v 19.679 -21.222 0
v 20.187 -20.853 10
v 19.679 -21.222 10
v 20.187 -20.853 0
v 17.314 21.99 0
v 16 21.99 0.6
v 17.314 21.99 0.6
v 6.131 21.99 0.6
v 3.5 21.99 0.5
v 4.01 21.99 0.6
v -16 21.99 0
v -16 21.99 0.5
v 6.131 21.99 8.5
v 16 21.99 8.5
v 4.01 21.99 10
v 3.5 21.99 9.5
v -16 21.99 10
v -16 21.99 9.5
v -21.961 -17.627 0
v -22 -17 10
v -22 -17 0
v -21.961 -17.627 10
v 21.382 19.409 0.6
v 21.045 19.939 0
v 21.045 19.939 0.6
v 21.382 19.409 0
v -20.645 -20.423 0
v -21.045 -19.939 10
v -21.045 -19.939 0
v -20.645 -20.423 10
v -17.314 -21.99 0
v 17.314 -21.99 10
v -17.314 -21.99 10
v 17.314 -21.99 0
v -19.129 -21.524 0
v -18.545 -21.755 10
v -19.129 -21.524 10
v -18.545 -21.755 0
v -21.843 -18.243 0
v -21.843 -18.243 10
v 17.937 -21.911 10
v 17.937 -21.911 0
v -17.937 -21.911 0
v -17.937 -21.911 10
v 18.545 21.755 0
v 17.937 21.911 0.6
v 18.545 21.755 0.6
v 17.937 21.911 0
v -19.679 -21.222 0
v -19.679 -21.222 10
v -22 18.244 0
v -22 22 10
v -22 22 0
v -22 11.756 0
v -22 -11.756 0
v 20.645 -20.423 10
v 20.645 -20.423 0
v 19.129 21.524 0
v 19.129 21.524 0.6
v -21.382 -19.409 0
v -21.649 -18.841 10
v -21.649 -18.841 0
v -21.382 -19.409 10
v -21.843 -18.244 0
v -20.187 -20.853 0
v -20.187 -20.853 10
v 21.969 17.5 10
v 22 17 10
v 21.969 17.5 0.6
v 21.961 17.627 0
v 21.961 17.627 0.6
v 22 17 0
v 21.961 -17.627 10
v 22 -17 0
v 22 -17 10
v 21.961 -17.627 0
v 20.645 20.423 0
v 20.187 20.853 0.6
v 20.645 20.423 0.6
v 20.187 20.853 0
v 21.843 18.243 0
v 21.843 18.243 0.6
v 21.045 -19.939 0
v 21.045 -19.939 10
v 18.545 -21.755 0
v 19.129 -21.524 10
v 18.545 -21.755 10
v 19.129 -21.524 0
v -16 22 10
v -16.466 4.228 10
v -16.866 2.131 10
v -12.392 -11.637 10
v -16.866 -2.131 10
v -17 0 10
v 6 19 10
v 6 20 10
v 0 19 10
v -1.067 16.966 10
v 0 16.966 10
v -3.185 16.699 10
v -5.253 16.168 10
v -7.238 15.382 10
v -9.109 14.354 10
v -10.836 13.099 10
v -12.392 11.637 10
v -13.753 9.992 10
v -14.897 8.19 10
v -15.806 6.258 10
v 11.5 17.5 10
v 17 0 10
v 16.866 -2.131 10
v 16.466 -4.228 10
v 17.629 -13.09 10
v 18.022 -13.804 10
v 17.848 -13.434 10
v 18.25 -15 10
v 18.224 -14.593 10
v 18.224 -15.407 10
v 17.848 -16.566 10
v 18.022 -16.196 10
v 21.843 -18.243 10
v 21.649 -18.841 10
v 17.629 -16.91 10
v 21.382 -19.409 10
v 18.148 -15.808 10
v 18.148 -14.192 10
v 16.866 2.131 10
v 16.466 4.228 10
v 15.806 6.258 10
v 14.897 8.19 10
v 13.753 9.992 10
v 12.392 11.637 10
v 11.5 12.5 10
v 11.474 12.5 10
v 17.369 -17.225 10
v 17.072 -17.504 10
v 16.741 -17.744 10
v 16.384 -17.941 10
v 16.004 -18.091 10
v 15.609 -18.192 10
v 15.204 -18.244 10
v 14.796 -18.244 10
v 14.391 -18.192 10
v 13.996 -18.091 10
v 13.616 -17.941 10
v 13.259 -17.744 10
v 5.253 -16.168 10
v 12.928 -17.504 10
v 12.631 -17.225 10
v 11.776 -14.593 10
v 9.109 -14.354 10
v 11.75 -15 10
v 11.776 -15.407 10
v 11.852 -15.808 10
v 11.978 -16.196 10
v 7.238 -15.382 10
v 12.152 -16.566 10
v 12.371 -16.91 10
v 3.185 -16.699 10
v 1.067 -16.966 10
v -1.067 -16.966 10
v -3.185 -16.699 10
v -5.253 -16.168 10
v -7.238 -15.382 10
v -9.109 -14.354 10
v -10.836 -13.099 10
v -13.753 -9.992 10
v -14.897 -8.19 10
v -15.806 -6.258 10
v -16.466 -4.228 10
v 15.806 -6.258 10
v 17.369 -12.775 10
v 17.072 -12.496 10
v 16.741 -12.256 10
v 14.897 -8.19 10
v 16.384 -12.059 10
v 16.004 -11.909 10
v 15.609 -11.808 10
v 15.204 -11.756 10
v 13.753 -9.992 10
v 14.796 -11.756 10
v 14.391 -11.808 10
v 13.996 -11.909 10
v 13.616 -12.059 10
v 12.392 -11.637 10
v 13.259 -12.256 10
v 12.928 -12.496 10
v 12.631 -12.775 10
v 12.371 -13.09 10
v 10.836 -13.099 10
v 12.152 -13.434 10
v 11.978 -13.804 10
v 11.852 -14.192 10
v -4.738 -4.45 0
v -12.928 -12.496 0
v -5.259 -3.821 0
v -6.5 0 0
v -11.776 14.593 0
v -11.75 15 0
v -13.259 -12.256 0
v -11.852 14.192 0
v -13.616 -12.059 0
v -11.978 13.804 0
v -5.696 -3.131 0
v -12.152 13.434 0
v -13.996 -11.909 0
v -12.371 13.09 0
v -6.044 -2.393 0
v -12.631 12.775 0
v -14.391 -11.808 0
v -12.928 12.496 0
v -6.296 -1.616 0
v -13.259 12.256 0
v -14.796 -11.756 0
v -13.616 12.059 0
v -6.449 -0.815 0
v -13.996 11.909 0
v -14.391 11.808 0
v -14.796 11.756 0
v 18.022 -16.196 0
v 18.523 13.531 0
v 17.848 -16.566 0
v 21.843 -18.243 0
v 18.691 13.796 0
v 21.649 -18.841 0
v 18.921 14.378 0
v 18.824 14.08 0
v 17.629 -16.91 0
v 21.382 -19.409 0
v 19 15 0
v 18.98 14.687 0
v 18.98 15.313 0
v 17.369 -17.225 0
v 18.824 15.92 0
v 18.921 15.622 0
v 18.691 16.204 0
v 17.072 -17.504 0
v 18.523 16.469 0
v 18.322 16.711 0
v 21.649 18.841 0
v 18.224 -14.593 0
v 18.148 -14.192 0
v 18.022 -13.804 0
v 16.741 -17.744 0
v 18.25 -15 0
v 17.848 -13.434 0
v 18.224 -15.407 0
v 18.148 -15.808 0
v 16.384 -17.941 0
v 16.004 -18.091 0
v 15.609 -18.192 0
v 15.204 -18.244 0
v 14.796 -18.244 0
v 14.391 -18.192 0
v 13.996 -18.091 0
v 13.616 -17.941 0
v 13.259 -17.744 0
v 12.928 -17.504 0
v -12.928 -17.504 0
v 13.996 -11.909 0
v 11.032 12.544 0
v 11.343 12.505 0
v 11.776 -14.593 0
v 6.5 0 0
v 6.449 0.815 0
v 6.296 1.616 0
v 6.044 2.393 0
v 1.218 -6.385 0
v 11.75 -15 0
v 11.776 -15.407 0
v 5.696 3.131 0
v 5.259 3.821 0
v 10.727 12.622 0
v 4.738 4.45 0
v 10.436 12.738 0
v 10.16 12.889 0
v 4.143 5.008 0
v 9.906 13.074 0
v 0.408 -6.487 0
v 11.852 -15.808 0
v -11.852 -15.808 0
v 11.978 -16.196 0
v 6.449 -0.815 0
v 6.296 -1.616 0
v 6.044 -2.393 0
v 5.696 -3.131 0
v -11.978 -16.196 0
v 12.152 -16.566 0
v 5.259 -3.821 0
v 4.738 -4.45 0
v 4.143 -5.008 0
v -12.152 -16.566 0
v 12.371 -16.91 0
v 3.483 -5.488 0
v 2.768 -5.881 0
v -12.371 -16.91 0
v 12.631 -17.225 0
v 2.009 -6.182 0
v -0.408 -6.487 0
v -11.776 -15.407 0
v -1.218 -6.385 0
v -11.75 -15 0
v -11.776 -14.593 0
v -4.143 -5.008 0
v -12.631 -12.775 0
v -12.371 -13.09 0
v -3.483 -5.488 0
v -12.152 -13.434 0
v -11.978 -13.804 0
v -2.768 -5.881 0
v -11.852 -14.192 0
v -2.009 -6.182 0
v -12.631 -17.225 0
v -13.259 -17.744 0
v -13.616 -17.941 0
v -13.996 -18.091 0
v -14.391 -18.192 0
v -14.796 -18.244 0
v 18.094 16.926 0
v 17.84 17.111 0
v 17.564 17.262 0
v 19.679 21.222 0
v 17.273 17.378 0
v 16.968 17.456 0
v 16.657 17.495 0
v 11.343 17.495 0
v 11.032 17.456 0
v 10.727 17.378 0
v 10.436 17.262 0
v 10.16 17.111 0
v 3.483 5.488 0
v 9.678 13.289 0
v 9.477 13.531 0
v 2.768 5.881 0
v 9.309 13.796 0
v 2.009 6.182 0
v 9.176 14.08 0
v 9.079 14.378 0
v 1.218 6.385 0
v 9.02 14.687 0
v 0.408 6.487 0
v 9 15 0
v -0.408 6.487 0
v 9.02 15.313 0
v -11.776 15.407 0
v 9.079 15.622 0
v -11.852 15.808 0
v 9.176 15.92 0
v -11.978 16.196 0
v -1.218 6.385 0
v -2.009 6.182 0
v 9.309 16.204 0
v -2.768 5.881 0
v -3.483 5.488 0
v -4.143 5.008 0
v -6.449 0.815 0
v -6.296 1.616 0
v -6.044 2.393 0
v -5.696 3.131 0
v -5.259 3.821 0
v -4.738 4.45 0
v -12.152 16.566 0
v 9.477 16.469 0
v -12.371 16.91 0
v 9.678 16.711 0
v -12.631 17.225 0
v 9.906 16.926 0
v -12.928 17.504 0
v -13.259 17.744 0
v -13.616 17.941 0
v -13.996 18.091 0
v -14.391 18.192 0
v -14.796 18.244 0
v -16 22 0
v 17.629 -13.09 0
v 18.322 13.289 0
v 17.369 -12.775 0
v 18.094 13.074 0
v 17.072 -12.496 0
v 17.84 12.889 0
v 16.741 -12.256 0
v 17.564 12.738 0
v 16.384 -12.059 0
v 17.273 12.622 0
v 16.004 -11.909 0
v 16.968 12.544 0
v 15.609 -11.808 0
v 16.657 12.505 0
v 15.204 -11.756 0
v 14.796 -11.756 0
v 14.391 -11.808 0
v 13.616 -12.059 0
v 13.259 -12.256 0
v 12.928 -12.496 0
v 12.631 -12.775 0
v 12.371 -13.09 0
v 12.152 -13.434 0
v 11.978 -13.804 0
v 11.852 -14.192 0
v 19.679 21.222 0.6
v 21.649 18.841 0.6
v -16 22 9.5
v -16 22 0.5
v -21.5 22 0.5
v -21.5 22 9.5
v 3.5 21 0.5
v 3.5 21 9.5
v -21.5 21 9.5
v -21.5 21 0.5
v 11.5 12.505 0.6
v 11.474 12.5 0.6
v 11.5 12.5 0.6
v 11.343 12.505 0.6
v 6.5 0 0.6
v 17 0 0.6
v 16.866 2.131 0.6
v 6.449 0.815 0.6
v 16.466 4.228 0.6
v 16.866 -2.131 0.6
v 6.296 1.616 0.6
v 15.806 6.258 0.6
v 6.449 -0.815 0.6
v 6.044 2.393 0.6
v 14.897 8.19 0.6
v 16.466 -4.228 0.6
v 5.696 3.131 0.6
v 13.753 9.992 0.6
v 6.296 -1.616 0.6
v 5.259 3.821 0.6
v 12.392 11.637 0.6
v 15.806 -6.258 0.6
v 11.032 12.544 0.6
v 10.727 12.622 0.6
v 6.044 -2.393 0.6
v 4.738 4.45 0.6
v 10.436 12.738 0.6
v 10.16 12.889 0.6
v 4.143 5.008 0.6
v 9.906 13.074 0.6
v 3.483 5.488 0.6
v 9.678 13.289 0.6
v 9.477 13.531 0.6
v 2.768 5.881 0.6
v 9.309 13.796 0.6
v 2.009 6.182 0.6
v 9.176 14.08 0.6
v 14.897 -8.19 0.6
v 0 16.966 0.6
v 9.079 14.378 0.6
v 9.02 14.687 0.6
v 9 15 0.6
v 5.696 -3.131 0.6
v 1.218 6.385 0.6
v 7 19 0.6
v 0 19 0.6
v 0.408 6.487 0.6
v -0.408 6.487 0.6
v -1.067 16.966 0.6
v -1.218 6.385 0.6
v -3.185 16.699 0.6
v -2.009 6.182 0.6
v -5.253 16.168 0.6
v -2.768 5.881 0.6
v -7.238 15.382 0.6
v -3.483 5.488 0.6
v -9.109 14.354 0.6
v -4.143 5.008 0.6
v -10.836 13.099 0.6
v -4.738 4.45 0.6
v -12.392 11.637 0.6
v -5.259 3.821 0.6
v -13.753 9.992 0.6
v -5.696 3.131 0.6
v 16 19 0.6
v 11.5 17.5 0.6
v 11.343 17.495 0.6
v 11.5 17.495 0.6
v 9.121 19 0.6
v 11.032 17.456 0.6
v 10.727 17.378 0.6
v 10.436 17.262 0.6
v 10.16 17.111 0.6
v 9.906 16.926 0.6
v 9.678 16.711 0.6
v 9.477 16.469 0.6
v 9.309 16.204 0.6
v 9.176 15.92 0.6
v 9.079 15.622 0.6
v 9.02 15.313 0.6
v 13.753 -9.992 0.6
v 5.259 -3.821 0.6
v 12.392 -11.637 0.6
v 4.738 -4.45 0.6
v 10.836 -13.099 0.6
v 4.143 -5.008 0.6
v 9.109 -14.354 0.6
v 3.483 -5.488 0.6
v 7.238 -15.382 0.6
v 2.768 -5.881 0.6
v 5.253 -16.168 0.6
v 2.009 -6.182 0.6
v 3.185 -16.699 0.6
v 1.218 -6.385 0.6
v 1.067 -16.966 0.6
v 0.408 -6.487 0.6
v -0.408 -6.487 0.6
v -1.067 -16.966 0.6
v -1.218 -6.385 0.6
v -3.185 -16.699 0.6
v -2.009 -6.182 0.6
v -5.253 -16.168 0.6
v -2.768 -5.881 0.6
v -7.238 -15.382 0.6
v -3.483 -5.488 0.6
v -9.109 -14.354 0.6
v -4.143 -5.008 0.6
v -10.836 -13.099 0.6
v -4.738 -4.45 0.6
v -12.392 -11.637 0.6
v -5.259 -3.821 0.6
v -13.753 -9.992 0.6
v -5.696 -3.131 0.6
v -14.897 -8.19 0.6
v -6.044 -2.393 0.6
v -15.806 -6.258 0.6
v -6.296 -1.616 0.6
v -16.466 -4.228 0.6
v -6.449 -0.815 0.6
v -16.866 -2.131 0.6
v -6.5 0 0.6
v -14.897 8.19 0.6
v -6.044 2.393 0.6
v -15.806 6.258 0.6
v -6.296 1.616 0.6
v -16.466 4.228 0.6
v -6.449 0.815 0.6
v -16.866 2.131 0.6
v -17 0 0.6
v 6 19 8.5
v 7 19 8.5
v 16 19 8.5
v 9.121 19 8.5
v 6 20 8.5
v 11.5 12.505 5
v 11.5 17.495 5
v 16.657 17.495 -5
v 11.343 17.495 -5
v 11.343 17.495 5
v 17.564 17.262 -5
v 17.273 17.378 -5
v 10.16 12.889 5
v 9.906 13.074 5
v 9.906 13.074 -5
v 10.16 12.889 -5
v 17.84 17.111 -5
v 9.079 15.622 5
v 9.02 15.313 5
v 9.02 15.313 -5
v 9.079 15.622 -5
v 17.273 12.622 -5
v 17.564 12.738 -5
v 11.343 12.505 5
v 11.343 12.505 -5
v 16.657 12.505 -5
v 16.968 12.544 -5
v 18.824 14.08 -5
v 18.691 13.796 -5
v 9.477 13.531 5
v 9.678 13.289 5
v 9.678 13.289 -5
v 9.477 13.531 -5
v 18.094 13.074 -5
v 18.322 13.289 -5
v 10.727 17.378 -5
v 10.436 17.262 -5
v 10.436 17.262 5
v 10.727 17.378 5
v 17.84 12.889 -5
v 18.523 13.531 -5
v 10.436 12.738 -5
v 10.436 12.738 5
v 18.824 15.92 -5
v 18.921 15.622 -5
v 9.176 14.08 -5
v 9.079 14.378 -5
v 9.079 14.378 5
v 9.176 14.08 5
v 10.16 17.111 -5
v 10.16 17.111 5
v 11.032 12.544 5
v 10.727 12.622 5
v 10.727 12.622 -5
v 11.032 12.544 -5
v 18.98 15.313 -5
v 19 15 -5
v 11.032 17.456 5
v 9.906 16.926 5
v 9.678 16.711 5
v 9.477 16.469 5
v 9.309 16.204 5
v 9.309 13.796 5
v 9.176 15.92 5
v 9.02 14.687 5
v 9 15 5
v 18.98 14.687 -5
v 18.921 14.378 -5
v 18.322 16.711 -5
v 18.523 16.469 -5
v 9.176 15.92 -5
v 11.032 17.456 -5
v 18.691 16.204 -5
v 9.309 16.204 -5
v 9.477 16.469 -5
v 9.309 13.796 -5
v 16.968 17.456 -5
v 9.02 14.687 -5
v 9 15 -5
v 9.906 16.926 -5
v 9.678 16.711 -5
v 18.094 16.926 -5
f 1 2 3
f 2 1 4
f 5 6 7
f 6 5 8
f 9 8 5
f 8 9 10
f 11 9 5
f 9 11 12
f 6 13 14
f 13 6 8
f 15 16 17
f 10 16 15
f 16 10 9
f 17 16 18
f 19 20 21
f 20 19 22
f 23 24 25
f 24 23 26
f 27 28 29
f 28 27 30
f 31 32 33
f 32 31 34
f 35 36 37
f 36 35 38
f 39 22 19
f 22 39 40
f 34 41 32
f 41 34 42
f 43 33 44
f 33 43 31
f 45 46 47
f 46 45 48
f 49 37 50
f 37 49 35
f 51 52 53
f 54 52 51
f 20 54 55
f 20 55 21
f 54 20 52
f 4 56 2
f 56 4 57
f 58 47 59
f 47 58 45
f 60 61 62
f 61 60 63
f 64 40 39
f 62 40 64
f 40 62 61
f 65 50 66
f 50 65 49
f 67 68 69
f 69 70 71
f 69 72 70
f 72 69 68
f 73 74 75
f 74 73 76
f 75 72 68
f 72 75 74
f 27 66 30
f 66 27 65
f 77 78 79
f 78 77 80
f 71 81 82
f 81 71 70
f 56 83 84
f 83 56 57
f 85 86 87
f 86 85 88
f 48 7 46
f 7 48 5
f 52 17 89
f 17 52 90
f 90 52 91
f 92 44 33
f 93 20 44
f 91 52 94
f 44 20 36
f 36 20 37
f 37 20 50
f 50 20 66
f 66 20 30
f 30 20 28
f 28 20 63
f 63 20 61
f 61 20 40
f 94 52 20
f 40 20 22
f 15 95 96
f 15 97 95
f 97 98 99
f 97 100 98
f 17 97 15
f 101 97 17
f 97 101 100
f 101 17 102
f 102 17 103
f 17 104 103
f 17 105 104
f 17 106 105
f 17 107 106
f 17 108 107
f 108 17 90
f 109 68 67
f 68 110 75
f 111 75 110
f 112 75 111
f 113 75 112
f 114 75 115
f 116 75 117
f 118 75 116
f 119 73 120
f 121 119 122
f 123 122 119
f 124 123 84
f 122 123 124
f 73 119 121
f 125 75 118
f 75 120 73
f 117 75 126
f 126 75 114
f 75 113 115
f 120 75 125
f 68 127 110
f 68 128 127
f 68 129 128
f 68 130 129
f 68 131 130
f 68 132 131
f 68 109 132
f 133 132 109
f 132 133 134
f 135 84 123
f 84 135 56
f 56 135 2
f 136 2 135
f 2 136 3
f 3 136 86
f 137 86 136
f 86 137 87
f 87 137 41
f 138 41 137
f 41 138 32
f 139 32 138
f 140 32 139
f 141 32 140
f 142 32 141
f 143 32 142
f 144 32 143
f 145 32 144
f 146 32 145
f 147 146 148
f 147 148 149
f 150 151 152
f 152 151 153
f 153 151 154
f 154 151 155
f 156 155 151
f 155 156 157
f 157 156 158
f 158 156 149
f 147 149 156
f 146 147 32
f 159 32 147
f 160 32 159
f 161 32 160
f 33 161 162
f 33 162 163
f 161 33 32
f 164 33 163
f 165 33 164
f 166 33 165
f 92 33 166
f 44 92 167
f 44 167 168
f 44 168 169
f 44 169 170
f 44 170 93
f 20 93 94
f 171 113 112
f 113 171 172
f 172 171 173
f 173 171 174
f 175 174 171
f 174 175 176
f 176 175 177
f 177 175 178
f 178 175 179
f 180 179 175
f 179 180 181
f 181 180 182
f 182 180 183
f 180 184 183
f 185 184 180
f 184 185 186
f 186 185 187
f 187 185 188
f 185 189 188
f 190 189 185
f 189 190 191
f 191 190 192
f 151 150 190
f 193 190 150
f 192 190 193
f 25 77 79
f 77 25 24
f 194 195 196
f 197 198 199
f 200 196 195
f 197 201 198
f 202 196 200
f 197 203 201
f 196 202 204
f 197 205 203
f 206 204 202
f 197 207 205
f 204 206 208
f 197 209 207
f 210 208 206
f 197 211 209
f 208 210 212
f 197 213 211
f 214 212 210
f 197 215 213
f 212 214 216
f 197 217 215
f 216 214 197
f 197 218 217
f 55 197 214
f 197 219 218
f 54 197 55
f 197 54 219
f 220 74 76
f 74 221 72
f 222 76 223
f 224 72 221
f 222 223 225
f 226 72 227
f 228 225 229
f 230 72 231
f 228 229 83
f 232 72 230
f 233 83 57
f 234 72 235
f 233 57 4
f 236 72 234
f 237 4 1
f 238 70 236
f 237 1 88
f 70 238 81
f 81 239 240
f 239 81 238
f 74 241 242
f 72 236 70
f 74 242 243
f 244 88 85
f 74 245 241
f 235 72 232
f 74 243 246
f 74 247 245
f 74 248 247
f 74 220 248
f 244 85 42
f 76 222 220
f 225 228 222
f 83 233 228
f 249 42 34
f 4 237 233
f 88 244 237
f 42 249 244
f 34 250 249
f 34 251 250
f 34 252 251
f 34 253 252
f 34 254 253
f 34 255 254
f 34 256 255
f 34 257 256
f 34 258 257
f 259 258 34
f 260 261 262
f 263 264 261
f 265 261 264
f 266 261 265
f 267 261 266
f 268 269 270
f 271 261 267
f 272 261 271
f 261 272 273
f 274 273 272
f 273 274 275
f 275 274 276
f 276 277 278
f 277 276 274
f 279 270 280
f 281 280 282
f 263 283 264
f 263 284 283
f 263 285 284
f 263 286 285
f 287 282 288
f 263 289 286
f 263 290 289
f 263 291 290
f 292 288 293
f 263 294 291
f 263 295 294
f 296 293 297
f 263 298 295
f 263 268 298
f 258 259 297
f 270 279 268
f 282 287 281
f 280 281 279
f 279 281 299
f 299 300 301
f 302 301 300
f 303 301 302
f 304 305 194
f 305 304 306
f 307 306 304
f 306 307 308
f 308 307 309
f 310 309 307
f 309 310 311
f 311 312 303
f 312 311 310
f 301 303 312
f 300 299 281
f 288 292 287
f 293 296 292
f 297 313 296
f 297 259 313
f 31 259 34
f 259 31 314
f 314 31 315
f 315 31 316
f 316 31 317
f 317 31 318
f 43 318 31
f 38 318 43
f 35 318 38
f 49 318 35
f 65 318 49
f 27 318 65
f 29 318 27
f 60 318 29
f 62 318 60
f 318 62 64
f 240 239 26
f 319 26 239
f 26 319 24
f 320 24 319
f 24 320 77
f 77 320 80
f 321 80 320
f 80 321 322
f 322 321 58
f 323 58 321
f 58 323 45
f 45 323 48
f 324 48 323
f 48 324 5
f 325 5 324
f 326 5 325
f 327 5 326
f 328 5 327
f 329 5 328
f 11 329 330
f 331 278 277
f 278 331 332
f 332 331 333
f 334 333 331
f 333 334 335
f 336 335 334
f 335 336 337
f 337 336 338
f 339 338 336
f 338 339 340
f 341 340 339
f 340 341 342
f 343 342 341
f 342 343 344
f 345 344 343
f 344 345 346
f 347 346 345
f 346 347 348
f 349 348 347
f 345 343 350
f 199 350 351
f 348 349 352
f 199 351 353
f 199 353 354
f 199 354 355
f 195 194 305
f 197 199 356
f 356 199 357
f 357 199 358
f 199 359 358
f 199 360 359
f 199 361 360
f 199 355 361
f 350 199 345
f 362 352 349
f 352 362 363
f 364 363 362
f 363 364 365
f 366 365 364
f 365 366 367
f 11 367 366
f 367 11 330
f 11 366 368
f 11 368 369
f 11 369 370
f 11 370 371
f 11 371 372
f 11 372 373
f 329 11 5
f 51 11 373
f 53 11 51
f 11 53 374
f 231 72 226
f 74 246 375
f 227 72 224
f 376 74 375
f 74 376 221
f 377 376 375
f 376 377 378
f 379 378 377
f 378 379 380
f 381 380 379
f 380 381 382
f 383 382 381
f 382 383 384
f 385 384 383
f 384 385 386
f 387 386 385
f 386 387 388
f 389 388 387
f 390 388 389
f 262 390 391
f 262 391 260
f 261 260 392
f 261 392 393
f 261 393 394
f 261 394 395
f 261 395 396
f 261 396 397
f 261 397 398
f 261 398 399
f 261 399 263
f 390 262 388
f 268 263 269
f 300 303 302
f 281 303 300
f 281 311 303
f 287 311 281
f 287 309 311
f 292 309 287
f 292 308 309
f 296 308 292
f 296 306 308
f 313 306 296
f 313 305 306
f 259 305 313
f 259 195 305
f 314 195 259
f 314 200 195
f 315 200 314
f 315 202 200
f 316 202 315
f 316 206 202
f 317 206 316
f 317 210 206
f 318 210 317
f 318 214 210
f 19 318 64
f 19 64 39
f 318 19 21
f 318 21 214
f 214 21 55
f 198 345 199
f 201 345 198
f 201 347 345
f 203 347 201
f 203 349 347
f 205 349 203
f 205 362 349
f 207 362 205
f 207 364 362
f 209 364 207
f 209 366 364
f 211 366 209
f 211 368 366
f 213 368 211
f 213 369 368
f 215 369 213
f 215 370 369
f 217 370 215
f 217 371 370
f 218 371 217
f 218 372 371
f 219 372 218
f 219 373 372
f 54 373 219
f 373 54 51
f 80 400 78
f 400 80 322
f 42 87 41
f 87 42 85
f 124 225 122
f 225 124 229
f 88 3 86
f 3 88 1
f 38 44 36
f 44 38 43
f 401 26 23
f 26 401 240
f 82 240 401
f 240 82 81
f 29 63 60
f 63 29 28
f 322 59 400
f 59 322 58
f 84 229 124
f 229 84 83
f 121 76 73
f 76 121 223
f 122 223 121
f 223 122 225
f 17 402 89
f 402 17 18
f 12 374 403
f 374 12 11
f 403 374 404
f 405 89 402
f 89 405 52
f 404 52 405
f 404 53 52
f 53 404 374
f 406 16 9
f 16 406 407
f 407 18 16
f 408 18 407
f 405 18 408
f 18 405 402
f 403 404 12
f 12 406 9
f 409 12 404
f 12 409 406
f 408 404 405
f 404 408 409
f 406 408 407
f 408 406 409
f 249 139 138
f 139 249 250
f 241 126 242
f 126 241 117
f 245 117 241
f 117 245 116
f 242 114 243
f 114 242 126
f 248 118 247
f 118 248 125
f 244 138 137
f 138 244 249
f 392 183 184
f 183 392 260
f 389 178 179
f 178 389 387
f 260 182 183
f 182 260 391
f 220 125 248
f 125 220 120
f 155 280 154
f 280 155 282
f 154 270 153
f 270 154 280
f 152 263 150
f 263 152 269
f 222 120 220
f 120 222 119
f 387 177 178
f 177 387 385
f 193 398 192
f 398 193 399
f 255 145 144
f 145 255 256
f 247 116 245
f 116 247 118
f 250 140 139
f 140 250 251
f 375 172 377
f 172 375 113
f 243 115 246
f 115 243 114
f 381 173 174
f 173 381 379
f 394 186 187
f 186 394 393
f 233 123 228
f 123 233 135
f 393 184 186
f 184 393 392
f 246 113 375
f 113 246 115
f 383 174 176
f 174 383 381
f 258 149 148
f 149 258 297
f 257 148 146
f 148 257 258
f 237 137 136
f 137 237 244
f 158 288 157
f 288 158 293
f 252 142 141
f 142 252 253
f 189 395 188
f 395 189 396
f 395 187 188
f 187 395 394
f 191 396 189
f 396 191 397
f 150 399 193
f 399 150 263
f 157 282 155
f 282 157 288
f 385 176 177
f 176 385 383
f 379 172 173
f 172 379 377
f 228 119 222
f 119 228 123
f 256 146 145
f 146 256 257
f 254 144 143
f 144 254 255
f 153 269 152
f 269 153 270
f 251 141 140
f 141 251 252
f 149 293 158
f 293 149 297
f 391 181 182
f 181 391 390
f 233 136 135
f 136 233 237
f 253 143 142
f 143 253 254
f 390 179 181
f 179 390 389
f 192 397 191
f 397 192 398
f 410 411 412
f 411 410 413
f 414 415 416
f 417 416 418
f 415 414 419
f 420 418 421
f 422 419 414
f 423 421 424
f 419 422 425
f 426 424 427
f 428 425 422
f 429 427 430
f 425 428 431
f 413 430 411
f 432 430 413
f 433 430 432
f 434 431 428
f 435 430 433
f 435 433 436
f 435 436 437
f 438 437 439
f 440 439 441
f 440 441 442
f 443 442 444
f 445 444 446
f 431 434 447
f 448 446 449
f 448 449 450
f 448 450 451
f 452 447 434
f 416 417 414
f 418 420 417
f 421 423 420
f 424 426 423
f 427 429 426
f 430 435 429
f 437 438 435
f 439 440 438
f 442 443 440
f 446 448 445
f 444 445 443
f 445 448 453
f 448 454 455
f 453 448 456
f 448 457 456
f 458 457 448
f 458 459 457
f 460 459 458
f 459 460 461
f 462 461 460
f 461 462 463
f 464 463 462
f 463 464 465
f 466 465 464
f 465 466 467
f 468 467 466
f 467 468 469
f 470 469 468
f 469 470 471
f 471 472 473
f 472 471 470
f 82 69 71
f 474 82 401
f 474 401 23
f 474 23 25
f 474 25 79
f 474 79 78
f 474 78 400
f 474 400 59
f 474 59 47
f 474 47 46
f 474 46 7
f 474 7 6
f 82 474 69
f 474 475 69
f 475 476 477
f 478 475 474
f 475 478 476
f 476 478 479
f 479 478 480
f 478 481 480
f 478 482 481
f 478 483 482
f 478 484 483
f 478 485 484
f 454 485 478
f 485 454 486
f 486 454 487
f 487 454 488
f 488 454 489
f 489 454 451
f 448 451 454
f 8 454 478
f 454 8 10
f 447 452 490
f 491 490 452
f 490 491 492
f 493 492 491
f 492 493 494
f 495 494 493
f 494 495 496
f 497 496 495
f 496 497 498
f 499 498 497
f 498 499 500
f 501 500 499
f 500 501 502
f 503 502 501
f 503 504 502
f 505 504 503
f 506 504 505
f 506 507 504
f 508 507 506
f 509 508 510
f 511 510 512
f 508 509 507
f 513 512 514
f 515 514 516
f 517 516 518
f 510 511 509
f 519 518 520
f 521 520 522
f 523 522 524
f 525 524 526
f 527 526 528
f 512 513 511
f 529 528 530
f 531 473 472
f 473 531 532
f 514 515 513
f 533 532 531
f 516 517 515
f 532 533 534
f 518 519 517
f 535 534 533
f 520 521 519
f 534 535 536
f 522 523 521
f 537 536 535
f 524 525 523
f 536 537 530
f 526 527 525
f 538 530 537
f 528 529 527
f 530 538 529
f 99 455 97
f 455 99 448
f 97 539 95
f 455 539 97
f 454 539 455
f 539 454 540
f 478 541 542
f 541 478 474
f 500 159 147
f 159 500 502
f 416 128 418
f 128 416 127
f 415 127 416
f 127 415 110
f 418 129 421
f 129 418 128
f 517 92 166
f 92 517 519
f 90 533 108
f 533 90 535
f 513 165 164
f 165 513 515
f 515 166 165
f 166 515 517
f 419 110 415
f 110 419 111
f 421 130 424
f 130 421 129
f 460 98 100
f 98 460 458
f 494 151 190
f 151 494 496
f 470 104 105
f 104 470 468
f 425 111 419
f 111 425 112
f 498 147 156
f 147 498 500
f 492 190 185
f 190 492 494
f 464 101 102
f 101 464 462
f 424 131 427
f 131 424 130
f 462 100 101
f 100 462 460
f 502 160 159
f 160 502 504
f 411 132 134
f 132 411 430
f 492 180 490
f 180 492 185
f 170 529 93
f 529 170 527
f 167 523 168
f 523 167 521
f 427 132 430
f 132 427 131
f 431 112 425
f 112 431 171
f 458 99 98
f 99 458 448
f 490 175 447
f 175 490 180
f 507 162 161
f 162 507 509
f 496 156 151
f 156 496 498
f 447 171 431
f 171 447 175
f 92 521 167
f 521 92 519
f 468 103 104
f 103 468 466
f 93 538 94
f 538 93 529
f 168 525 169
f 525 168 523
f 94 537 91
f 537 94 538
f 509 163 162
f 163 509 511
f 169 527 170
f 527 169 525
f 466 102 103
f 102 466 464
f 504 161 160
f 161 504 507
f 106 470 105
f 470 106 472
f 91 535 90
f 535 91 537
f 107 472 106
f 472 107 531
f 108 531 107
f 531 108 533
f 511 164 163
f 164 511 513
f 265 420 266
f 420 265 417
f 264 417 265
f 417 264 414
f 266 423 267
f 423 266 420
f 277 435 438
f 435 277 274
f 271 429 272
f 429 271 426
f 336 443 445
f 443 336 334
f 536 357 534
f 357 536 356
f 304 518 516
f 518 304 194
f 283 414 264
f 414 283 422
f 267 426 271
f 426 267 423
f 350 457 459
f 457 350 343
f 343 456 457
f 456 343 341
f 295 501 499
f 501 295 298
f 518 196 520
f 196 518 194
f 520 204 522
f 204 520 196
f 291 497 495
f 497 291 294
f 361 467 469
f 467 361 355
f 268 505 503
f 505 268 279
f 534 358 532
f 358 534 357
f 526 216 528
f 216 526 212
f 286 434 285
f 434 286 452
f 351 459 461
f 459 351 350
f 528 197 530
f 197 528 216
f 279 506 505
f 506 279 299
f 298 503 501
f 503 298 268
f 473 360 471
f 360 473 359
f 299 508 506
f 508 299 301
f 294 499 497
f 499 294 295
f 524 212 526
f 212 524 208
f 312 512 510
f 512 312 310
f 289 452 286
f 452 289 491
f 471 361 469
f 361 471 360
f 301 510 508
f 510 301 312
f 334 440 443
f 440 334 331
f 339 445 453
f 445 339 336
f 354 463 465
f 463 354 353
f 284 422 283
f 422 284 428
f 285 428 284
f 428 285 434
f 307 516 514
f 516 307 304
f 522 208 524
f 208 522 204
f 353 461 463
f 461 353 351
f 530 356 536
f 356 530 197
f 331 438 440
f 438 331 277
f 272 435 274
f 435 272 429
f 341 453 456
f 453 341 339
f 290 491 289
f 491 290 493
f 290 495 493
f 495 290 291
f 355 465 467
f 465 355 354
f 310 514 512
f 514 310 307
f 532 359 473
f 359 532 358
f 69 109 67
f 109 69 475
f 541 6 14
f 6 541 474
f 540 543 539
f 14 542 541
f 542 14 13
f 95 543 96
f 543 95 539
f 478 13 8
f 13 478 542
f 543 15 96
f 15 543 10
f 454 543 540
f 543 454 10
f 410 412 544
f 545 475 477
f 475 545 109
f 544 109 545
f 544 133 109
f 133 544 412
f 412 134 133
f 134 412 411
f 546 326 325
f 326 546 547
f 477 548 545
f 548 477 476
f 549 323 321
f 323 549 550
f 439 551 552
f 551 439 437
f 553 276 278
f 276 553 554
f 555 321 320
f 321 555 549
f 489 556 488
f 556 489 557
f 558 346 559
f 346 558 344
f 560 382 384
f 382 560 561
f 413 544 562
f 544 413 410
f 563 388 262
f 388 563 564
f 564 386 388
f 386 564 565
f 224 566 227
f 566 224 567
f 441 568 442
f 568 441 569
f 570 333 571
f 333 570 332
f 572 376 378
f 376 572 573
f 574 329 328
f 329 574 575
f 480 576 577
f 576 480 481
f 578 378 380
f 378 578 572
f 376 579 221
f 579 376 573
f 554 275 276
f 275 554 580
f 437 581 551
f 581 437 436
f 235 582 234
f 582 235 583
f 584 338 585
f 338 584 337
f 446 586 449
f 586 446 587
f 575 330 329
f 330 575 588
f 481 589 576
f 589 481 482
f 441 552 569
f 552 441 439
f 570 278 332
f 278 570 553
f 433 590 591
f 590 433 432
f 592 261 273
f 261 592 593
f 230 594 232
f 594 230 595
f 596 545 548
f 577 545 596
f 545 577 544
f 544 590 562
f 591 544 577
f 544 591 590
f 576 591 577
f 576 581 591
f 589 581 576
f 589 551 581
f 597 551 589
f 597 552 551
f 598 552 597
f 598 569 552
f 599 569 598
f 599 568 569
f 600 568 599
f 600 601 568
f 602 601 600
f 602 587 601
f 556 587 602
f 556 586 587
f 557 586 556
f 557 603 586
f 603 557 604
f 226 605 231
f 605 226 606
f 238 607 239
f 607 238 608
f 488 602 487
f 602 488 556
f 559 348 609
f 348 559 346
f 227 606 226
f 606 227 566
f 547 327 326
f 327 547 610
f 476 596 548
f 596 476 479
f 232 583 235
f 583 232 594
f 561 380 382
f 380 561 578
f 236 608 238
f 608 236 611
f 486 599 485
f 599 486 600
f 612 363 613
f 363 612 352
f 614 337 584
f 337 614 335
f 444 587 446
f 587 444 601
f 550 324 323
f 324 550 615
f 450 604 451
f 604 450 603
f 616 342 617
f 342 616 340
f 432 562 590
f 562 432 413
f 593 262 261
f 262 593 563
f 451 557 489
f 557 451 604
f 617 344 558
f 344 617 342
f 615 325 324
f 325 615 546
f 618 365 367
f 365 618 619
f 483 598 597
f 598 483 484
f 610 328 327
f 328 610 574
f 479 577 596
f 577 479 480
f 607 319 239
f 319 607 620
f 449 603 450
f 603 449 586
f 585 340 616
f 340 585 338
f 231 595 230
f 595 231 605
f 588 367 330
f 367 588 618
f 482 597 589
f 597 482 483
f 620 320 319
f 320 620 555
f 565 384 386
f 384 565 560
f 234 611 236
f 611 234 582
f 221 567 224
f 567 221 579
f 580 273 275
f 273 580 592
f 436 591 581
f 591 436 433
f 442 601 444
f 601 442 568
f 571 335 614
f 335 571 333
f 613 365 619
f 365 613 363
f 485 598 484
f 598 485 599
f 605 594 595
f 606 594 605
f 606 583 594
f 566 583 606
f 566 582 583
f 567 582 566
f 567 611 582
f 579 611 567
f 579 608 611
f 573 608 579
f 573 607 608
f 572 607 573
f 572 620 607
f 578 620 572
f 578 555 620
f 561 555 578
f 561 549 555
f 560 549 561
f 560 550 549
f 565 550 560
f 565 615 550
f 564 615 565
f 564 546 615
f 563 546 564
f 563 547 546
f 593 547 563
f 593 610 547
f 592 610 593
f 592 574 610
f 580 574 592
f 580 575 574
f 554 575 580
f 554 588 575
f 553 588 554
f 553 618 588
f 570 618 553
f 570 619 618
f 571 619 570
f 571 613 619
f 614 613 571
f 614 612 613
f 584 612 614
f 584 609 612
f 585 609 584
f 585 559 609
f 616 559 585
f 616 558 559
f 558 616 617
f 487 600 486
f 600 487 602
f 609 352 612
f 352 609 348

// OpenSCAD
$fn = 50;


union() {
	difference() {
		union() {
			hull() {
				translate(v = [-17.0000000000, 17.0000000000, 0]) {
					cylinder(h = 10, r = 5);
				}
				translate(v = [17.0000000000, 17.0000000000, 0]) {
					cylinder(h = 10, r = 5);
				}
				translate(v = [-17.0000000000, -17.0000000000, 0]) {
					cylinder(h = 10, r = 5);
				}
				translate(v = [17.0000000000, -17.0000000000, 0]) {
					cylinder(h = 10, r = 5);
				}
			}
			translate(v = [-22.0000000000, 16.0000000000, 0]) {
				cube(size = [6, 6, 10]);
			}
		}
		union() {
			translate(v = [-22.5000000000, -15.0000000000, -250.0000000000]) {
				rotate(a = [0, 0, 0]) {
					difference() {
						union() {
							hull() {
								translate(v = [7.5000000000, 0, 0]) {
									cylinder(h = 250, r = 3.2500000000, r1 = 3.2500000000, r2 = 3.2500000000);
								}
								translate(v = [-7.5000000000, 0, 0]) {
									cylinder(h = 250, r = 3.2500000000, r1 = 3.2500000000, r2 = 3.2500000000);
								}
							}
						}
						union();
					}
				}
			}
			translate(v = [-22.5000000000, 15.0000000000, -250.0000000000]) {
				rotate(a = [0, 0, 0]) {
					difference() {
						union() {
							hull() {
								translate(v = [7.5000000000, 0, 0]) {
									cylinder(h = 250, r = 3.2500000000, r1 = 3.2500000000, r2 = 3.2500000000);
								}
								translate(v = [-7.5000000000, 0, 0]) {
									cylinder(h = 250, r = 3.2500000000, r1 = 3.2500000000, r2 = 3.2500000000);
								}
							}
						}
						union();
					}
				}
			}
			translate(v = [-21.5000000000, 21.0000000000, 0.5000000000]) {
				cube(size = [25, 1, 9.0000000000]);
			}
			translate(v = [15.0000000000, -15.0000000000, 0]) {
				cylinder(h = 100, r = 3.2500000000);
			}
			translate(v = [0.0000000000, 11.0000000000, 0.6000000000]) {
				cube(size = [11, 8, 12.4000000000]);
			}
			translate(v = [0, 0, 0.6000000000]) {
				cylinder(h = 12.4000000000, r = 17.0000000000);
			}
			translate(v = [0, 0, -5.0000000000]) {
				cylinder(h = 10, r = 6.5000000000);
			}
			translate(v = [0.0000000000, 17.5000000000, 0.6000000000]) {
				cube(size = [22.0000000000, 1.5000000000, 12.4000000000]);
			}
			translate(v = [16.0000000000, 17.5000000000, 0.6000000000]) {
				cube(size = [6, 4.5000000000, 12.4000000000]);
			}
			translate(v = [6.0000000000, 17.5000000000, 8.5000000000]) {
				cube(size = [16, 4.5000000000, 1.5000000000]);
			}
			translate(v = [3.2500000000, 22.7500000000, 0.6000000000]) {
				rotate(a = [0, 0, -45]) {
					cube(size = [7.5000000000, 1.5000000000, 12.4000000000]);
				}
			}
			translate(v = [2.5000000000, 12.5000000000, 0.6000000000]) {
				cube(size = [9.0000000000, 5, 9.4000000000]);
			}
		}
	}
	union() {
		translate(v = [14, 15.0000000000, -5.0000000000]) {
			rotate(a = [0, 0, 0]) {
				difference() {
					union() {
						#hull() {
							#translate(v = [2.5000000000, 0, 0]) {
								cylinder(h = 10, r = 2.5000000000, r1 = 2.5000000000, r2 = 2.5000000000);
							}
							#translate(v = [-2.5000000000, 0, 0]) {
								cylinder(h = 10, r = 2.5000000000, r1 = 2.5000000000, r2 = 2.5000000000);
							}
						}
					}
					union();
				}
			}
		}
	}
}
